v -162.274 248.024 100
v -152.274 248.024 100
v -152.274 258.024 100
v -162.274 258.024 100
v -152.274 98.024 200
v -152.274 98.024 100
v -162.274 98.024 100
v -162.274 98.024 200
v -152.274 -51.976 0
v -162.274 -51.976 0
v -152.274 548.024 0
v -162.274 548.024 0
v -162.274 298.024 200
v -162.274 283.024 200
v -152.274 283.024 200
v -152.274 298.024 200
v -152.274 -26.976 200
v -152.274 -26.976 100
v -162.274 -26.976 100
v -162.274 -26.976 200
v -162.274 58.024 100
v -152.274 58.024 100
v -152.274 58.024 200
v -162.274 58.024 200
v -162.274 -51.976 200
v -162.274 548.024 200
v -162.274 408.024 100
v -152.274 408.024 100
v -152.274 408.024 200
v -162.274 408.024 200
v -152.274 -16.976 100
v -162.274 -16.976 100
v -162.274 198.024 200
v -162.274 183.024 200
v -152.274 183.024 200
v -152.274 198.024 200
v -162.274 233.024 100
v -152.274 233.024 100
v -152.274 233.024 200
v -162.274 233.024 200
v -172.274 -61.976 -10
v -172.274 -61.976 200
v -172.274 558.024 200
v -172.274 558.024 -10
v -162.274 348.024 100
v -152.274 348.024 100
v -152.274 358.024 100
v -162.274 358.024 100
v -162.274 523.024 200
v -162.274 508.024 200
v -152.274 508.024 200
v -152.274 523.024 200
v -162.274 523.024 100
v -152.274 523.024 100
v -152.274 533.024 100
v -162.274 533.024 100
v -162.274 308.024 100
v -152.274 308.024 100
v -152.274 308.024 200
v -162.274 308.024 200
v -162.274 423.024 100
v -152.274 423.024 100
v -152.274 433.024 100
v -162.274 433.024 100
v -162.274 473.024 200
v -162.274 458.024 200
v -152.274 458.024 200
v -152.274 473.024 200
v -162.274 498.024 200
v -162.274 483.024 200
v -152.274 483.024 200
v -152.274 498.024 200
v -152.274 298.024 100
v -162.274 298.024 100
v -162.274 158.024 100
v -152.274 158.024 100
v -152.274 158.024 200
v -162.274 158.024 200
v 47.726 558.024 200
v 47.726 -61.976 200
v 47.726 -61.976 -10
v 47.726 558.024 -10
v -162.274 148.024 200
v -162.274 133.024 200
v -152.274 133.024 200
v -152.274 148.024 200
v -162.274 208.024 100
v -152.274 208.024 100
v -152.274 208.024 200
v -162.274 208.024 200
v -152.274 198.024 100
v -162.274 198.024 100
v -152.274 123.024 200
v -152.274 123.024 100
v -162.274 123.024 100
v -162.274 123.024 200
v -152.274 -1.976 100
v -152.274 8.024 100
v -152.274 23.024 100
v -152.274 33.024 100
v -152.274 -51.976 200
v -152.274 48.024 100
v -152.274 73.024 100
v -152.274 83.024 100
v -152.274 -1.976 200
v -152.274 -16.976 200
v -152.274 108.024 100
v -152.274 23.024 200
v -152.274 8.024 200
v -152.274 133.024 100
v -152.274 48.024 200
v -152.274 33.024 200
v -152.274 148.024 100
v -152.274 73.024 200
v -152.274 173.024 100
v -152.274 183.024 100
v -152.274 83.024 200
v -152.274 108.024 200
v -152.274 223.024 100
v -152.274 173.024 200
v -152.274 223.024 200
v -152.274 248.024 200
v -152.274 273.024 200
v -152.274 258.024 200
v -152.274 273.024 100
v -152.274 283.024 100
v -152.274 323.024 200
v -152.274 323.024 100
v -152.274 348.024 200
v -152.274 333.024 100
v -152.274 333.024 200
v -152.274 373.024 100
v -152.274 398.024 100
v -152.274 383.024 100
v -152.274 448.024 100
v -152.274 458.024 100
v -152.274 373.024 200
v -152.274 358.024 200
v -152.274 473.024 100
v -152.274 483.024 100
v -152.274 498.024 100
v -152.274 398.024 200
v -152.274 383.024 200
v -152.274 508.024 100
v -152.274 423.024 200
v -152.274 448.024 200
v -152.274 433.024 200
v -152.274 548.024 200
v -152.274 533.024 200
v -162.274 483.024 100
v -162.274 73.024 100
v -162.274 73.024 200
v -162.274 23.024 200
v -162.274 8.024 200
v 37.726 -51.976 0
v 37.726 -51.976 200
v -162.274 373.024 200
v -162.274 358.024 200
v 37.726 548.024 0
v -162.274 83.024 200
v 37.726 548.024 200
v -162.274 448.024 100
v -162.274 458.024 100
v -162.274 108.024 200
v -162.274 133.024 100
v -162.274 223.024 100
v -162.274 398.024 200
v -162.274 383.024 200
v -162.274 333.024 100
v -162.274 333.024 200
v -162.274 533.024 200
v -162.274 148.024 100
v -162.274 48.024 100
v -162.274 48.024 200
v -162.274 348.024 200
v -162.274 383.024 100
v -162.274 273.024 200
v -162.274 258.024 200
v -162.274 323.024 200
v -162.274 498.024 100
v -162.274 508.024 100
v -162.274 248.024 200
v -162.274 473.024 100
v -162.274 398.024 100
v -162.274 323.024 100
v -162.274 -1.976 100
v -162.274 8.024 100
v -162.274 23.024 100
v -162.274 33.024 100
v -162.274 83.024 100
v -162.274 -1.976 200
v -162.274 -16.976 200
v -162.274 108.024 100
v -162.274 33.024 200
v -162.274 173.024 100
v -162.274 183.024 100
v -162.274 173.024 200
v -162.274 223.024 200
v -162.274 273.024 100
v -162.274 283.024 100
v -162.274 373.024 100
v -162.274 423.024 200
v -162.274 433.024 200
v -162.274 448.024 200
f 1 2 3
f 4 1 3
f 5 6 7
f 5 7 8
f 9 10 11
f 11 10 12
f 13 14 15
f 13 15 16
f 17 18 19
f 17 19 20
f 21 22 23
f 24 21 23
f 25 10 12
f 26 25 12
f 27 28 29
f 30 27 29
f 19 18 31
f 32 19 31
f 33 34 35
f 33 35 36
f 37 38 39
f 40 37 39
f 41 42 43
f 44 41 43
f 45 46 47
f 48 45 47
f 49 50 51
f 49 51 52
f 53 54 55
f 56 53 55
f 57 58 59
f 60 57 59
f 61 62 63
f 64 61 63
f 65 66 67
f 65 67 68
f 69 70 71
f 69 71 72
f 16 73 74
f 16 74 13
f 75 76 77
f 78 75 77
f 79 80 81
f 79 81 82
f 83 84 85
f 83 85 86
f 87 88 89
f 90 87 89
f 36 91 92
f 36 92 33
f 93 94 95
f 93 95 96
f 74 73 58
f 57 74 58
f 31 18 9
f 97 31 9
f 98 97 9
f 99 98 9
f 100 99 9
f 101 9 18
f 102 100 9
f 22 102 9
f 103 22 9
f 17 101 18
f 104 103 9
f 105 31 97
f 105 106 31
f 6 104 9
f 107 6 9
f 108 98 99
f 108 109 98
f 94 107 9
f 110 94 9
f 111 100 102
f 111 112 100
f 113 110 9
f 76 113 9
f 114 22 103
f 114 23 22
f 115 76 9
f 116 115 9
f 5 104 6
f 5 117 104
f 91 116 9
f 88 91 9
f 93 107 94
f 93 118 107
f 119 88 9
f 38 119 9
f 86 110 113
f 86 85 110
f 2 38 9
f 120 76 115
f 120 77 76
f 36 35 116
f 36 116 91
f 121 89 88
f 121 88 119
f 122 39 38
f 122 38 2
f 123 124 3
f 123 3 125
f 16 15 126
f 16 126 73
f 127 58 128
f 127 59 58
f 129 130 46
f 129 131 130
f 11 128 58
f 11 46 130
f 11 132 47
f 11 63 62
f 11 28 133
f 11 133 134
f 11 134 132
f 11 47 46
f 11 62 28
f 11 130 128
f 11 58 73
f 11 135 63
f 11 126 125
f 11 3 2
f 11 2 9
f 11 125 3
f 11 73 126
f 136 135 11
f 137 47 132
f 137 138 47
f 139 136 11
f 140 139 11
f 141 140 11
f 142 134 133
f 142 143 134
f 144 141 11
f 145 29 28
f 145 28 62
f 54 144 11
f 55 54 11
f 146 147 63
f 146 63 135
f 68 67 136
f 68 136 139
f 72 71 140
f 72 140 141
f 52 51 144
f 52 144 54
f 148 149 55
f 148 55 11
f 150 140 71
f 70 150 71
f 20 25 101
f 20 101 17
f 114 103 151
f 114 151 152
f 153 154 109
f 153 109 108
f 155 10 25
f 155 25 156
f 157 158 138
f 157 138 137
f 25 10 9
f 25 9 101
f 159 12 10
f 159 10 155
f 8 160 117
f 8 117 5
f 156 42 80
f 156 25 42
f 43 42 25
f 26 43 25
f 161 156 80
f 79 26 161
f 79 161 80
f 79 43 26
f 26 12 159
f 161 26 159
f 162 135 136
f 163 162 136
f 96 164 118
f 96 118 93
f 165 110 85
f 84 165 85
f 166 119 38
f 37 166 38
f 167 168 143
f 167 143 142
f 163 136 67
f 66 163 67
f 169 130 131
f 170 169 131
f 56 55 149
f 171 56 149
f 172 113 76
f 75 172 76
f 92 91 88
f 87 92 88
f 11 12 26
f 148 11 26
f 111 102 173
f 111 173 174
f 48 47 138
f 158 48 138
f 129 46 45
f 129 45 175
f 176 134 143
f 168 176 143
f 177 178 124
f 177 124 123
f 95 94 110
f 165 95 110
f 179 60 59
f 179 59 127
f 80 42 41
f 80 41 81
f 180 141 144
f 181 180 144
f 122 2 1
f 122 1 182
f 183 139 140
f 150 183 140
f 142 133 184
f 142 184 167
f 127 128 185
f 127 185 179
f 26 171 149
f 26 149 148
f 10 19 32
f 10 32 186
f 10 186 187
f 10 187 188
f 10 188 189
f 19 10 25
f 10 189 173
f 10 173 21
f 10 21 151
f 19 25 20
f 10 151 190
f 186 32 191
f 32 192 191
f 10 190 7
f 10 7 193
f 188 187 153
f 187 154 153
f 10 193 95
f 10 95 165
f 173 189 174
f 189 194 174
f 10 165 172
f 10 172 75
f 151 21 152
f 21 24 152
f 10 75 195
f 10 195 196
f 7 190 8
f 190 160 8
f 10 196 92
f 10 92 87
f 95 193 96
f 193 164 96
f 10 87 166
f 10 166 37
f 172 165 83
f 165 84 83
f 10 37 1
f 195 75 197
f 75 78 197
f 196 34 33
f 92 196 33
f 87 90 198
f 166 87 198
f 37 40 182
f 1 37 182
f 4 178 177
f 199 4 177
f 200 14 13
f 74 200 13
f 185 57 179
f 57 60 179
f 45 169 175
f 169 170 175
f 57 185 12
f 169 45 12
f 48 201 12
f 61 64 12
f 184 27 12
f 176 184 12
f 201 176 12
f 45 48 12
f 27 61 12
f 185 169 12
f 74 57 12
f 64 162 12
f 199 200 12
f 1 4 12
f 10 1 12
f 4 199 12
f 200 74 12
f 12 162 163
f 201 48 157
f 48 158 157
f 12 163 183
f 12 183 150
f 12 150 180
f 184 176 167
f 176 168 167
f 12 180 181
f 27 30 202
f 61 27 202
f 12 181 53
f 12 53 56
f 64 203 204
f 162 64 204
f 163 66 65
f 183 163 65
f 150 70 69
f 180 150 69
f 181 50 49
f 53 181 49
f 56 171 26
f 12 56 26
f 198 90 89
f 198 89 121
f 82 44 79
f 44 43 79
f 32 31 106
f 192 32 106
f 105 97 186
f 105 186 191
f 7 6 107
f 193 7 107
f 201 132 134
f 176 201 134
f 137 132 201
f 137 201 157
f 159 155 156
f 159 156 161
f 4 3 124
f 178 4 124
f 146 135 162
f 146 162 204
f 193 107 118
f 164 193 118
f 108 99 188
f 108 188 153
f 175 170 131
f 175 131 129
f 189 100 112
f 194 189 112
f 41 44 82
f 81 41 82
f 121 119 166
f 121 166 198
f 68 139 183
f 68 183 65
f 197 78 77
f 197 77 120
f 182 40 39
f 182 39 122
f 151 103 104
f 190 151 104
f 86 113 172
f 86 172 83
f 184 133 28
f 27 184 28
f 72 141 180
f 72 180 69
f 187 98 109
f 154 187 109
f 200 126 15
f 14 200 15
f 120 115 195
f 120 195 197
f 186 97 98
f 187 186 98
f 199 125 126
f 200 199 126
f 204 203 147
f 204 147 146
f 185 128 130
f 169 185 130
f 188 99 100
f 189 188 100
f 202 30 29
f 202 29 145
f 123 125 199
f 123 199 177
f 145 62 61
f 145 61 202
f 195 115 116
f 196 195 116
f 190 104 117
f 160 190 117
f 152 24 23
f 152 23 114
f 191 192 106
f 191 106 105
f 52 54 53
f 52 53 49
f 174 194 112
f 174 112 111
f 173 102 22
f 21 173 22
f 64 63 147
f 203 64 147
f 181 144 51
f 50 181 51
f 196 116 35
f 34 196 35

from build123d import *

# Parameters (mm, degrees)
F0_W     = 220
F0_H     = 620
F0_W_2   = 200
F0_H_2   = 600
F1_DEPTH = 200
F2_DEPTH = 10
F3_W     = 600
F3_H     = 200
F4_DEPTH = 10
F5_W     = 10
F5_H     = 100
F6_DEPTH = 10


with BuildPart() as f1:
    # F0 (on Top) → F1 (new body)
    with BuildSketch(Plane.XY):
        with Locations((-62.2743272781, 248.0239227414)):
            Rectangle(F0_W, F0_H)
        with Locations((-62.2743272781, 248.0239227414)):
            Rectangle(F0_W_2, F0_H_2, mode=Mode.SUBTRACT)
    extrude(amount=F1_DEPTH)

    # F0 (on Top) → F2 (join)
    with BuildSketch(Plane.XY):
        with Locations((-62.2743272781, 248.0239227414)):
            Rectangle(F0_W, F0_H)
        with Locations((-62.2743272781, 248.0239227414)):
            Rectangle(F0_W_2, F0_H_2, mode=Mode.SUBTRACT)
        with Locations((-62.2743272781, 248.0239227414)):
            Rectangle(F0_W_2, F0_H_2)
    extrude(amount=-F2_DEPTH)


with BuildPart() as f4:
    # F3 (on face) → F4 (new body)
    with BuildSketch(Plane.YZ.offset(-162.2743272781)):
        with Locations((248.0239227414, 100)):
            Rectangle(F3_W, F3_H)
    extrude(amount=F4_DEPTH)

    # F5 (on face) → F6 (cut, through all)
    with BuildSketch(Plane.YZ.offset(-152.2743272781)):
        with Locations((-21.9760772586, 150)):
            Rectangle(F5_W, F5_H)
        with Locations((3.0239227414, 150)):
            Rectangle(F5_W, F5_H)
        with Locations((28.0239227414, 150)):
            Rectangle(F5_W, F5_H)
        with Locations((53.0239227414, 150)):
            Rectangle(F5_W, F5_H)
        with Locations((78.0239227414, 150)):
            Rectangle(F5_W, F5_H)
        with Locations((103.0239227414, 150)):
            Rectangle(F5_W, F5_H)
        with Locations((128.0239227414, 150)):
            Rectangle(F5_W, F5_H)
        with Locations((153.0239227414, 150)):
            Rectangle(F5_W, F5_H)
        with Locations((178.0239227414, 150)):
            Rectangle(F5_W, F5_H)
        with Locations((203.0239227414, 150)):
            Rectangle(F5_W, F5_H)
        with Locations((228.0239227414, 150)):
            Rectangle(F5_W, F5_H)
        with Locations((253.0239227414, 150)):
            Rectangle(F5_W, F5_H)
        with Locations((278.0239227414, 150)):
            Rectangle(F5_W, F5_H)
        with Locations((303.0239227414, 150)):
            Rectangle(F5_W, F5_H)
        with Locations((328.0239227414, 150)):
            Rectangle(F5_W, F5_H)
        with Locations((353.0239227414, 150)):
            Rectangle(F5_W, F5_H)
        with Locations((378.0239227414, 150)):
            Rectangle(F5_W, F5_H)
        with Locations((403.0239227414, 150)):
            Rectangle(F5_W, F5_H)
        with Locations((428.0239227414, 150)):
            Rectangle(F5_W, F5_H)
        with Locations((453.0239227414, 150)):
            Rectangle(F5_W, F5_H)
        with Locations((478.0239227414, 150)):
            Rectangle(F5_W, F5_H)
        with Locations((503.0239227414, 150)):
            Rectangle(F5_W, F5_H)
        with Locations((528.0239227414, 150)):
            Rectangle(F5_W, F5_H)
    extrude(amount=-F6_DEPTH, mode=Mode.SUBTRACT)


solid = Compound([f1.part, f4.part])
